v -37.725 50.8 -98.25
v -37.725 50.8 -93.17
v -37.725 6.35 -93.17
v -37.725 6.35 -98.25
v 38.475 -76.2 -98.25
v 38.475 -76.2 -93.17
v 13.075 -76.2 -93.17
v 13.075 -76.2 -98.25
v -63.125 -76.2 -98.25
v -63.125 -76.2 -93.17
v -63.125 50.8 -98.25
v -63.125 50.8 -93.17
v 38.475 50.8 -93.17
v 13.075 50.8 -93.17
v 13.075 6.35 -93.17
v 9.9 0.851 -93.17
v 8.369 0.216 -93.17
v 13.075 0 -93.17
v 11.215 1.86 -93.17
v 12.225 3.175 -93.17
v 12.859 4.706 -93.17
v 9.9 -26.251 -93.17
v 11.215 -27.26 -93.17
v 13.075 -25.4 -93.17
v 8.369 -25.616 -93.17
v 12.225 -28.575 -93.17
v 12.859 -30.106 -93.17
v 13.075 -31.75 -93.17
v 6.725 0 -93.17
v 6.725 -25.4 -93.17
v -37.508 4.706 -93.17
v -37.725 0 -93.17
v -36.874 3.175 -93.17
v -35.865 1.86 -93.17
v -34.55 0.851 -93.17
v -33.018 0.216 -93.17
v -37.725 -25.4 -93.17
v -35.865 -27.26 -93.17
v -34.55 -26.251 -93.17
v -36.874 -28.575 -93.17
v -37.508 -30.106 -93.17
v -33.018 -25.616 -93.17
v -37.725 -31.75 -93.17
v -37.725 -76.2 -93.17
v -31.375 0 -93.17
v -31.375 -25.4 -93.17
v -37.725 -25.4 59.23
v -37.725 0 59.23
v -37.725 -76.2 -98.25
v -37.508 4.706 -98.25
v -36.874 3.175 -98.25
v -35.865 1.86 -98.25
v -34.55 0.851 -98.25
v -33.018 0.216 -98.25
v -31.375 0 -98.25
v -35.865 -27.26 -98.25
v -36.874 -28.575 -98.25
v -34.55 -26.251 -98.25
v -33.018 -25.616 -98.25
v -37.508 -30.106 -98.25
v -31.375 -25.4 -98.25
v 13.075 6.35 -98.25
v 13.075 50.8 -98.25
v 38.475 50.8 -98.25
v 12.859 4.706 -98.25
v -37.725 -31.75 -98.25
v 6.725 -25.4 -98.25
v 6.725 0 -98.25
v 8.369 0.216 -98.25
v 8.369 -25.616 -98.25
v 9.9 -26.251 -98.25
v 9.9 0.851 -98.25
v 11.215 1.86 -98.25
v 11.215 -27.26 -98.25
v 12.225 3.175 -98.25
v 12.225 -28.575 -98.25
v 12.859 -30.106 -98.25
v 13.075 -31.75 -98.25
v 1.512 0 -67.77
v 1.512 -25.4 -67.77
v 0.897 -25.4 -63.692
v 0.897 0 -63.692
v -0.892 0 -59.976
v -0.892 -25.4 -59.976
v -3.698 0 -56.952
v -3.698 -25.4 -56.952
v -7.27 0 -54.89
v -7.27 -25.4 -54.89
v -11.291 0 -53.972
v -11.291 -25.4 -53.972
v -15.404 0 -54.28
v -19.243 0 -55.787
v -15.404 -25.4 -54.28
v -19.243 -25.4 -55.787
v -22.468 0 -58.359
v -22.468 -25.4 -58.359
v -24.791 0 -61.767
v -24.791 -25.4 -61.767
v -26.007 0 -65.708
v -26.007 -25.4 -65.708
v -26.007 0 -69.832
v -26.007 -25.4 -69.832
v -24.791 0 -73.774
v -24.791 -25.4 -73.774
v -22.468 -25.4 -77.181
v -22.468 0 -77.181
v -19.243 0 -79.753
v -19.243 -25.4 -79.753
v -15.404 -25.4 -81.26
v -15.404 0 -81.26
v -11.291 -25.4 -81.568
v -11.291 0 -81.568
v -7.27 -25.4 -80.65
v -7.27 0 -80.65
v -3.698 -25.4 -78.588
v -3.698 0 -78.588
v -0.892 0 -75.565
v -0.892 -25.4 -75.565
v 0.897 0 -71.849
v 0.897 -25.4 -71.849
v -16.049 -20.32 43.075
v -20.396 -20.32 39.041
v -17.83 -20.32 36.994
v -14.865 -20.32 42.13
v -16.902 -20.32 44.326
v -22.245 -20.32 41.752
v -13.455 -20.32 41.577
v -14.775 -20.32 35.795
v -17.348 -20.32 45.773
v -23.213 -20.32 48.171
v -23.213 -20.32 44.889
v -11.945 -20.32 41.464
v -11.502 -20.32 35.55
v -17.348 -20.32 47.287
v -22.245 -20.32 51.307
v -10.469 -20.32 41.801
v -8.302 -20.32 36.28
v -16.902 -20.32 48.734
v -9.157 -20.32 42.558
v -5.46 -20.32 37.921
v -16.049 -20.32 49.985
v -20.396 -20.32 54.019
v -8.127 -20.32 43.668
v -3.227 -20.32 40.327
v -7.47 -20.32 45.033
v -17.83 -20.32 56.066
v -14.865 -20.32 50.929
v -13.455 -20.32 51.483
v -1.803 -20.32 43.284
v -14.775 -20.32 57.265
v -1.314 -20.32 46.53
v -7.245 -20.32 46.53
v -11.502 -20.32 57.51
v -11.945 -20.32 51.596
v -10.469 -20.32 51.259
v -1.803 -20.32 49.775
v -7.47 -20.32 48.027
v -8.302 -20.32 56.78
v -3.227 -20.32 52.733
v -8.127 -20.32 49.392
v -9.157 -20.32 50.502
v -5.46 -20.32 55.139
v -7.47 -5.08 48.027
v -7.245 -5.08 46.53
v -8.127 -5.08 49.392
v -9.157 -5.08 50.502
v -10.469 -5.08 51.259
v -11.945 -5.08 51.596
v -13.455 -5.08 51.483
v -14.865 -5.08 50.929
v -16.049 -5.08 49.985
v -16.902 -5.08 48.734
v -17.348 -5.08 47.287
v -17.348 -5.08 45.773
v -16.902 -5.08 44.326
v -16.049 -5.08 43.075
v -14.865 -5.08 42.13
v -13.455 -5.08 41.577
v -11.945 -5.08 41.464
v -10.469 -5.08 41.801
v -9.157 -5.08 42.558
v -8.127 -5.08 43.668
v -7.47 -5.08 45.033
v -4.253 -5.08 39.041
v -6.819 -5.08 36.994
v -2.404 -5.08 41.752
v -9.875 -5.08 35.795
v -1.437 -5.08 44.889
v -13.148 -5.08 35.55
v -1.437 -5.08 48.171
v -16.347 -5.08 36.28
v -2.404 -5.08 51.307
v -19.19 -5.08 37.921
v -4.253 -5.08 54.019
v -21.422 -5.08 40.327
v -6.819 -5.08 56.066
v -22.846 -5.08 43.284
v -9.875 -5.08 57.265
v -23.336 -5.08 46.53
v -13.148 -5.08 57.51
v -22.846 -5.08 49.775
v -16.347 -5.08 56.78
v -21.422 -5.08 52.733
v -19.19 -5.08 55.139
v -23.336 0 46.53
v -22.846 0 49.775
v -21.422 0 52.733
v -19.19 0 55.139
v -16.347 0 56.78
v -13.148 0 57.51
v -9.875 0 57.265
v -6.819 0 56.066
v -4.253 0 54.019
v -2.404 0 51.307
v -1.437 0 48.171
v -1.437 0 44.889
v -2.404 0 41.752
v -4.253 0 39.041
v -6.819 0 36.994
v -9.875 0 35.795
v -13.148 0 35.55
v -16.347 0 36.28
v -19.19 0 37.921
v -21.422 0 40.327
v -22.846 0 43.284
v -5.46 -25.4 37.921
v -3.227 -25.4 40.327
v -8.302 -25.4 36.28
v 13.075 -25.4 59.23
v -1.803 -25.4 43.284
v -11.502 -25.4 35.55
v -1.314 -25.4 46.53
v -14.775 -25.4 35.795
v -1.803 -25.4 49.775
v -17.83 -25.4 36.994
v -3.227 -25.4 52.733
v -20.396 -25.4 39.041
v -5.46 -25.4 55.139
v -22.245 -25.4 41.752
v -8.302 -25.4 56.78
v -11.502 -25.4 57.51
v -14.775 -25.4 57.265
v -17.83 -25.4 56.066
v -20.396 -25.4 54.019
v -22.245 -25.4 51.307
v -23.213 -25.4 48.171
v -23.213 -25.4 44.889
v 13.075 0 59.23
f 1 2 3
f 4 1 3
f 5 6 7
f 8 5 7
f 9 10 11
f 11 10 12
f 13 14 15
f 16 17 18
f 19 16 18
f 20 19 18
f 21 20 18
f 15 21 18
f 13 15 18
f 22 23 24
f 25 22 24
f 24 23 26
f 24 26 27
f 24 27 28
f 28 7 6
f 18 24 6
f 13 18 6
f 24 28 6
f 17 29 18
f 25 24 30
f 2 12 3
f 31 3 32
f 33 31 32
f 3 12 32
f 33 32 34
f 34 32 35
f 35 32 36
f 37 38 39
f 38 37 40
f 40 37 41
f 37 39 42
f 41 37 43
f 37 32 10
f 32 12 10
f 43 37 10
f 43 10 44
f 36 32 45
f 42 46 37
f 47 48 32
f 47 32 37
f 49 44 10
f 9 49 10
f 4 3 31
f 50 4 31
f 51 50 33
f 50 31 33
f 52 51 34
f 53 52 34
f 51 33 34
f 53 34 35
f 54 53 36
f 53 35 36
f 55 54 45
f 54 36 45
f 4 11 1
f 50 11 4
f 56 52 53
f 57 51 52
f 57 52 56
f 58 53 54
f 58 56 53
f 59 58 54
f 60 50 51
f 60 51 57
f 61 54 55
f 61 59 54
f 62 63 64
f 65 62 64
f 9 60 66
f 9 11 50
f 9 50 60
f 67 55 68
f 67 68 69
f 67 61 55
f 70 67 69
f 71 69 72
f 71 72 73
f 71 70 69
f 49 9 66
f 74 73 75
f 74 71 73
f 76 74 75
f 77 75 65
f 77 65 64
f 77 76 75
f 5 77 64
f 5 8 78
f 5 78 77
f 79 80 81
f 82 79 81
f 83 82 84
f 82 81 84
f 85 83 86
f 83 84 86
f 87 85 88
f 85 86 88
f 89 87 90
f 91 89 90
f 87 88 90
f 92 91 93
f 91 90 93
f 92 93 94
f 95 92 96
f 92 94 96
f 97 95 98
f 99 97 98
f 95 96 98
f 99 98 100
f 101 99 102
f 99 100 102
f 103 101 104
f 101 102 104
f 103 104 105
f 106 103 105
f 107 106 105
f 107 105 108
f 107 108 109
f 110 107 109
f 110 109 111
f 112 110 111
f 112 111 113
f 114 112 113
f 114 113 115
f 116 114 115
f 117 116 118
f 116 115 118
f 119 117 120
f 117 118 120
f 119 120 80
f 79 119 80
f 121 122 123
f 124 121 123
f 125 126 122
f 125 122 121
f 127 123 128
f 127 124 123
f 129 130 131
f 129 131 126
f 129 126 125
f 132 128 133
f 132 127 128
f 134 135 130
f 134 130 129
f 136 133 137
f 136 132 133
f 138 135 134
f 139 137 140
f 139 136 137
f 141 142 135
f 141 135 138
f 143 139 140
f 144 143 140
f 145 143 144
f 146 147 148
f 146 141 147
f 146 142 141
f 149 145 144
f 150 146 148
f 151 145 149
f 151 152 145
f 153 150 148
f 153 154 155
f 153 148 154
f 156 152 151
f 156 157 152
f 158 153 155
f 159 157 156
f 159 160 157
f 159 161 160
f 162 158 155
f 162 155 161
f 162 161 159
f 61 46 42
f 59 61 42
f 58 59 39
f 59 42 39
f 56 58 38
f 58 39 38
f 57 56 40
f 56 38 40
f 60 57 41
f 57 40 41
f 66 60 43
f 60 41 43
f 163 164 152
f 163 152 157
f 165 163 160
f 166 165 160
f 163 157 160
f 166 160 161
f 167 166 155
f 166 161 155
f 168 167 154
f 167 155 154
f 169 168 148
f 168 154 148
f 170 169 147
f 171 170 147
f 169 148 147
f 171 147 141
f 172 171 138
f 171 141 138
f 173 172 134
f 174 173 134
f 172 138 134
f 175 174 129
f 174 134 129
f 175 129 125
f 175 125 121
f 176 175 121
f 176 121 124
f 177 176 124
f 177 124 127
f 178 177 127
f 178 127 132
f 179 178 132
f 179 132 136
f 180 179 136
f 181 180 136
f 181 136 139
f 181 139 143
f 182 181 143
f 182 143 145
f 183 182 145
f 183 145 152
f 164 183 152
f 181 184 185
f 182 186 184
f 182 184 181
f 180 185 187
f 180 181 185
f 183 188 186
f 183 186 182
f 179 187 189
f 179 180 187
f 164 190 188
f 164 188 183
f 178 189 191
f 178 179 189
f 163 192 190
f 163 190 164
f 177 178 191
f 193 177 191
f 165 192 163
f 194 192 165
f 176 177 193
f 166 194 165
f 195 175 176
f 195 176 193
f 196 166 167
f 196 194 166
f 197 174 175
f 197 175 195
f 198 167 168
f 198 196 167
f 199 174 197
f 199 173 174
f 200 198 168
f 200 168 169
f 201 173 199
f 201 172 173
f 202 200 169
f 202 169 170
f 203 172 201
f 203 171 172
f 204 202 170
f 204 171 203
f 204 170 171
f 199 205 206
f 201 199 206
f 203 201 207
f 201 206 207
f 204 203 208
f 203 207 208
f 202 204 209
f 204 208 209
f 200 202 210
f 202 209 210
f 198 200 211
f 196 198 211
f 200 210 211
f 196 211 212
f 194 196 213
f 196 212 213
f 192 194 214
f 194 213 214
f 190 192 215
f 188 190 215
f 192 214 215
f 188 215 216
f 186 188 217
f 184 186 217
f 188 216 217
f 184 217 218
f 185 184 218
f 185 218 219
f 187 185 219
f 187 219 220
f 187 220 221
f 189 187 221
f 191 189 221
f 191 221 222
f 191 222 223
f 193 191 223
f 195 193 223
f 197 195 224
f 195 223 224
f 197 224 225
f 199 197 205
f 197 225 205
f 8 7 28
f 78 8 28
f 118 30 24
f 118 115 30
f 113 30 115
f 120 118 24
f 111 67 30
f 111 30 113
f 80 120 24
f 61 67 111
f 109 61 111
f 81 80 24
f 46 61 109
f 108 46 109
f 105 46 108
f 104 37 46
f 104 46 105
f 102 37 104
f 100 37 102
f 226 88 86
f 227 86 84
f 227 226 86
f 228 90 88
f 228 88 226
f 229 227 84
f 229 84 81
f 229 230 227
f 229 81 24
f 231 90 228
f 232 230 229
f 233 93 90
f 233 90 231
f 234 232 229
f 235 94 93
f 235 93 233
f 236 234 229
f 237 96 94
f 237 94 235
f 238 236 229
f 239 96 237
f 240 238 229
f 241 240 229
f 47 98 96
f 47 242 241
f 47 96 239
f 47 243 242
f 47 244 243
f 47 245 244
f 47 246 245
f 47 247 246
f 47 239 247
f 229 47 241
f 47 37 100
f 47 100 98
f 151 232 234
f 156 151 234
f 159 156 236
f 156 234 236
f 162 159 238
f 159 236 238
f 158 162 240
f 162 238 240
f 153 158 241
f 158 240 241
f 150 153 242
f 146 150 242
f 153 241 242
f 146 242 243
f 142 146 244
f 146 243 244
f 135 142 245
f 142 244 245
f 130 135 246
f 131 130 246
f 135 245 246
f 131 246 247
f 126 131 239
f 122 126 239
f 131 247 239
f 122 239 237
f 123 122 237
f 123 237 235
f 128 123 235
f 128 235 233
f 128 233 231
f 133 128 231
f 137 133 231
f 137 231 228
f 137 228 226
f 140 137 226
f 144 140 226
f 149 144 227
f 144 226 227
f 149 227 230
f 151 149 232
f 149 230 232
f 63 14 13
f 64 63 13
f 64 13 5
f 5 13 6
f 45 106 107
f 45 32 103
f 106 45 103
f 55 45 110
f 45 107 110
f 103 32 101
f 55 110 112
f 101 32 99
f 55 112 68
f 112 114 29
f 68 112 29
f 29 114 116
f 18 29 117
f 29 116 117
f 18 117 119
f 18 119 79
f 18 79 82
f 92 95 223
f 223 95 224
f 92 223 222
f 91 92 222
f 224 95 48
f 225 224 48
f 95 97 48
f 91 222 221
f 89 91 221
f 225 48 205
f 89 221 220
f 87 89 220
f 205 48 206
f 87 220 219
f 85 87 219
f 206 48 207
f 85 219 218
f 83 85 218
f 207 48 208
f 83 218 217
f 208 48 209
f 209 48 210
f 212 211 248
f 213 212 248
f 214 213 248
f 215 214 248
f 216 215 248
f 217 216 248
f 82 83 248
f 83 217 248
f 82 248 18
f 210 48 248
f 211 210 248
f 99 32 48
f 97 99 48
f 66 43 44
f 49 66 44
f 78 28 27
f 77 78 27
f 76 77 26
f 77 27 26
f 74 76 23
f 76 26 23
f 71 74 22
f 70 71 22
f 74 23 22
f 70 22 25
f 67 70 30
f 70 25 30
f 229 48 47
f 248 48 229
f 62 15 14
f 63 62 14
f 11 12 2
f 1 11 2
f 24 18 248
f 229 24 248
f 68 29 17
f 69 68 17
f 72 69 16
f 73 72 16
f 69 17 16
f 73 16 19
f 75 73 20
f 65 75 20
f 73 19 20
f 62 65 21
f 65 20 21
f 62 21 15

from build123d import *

# Parameters (mm, degrees)
F0_W      = 25.4
F0_H      = 127
F1_DEPTH  = 25.4
F2_W      = 50.8
F2_H      = 25.4
F3_DEPTH  = 25.4
F4_R      = 5.08
F5_DEPTH  = 25.4
F6_R      = 11.0109
F7_DEPTH  = 5.08
F8_R      = 11.0109
F9_DEPTH  = 5.08
F10_DEPTH = 25.4
F11_W     = 25.4
F11_H     = 127
F12_DEPTH = 12.7
F13_DEPTH = 12.7
F14_R     = 13.83665
F15_DEPTH = 25.4
F17_DEPTH = 5.08


with BuildPart() as f1:
    # F0 (on Front) → F1 (new body)
    with BuildSketch(Plane.XZ):
        with Locations((-12.3247115396, -29.6700978652)):
            Rectangle(F0_W, F0_H)
    extrude(amount=F1_DEPTH)

    # F2 (on face) → F3 (join)
    with BuildSketch(Plane.XY.offset(33.8299021348)):
        with Locations((-12.3247115396, -12.7)):
            Rectangle(F2_W, F2_H)
    extrude(amount=F3_DEPTH)

    # F4 (on face) → F5 (cut)
    with BuildSketch(Plane.XZ.offset(25.4)):
        with Locations((-12.3247115396, 46.5299021348)):
            Circle(F4_R)
    extrude(amount=-F5_DEPTH, mode=Mode.SUBTRACT)

    # F6 (on face) → F7 (cut)
    with BuildSketch(Plane.XZ.offset(25.4)):
        with Locations((-12.3247115396, 46.5299021348)):
            Circle(F6_R)
    extrude(amount=-F7_DEPTH, mode=Mode.SUBTRACT)

    # F8 (on face) → F9 (cut)
    with BuildSketch(Plane(origin=(0, 0, 0), x_dir=(-1, 0, 0), z_dir=(0, 1, 0))):
        with Locations((12.3247115396, 46.5299021348)):
            Circle(F8_R)
    extrude(amount=-F9_DEPTH, mode=Mode.SUBTRACT)

    # F4 (on face) → F10 (cut)
    with BuildSketch(Plane.XZ.offset(25.4)):
        with Locations((-12.3247115396, 46.5299021348)):
            Circle(F4_R)
    extrude(amount=-F10_DEPTH, mode=Mode.SUBTRACT)

    # F11 (on face) → F12 (join)
    with BuildSketch(Plane(origin=(-25.0247115396, 0, 0), x_dir=(0, -1, 0), z_dir=(-1, 0, 0))):
        with Locations((12.7, -29.6700978652)):
            Rectangle(F11_W, F11_H)
    extrude(amount=F12_DEPTH)

    # F13 (add): a face of the model
    f13_faces = [f1.faces().sort_by_distance(p)[0] for p in [
        (0.3752884604, -12.7, -29.6700978652),
    ]]
    extrude(f13_faces, amount=F13_DEPTH)

    # F14 (on face) → F15 (cut)
    with BuildSketch(Plane.XZ.offset(25.4)):
        with Locations((-12.3247115396, -67.7700978652)):
            Circle(F14_R)
    extrude(amount=-F15_DEPTH, mode=Mode.SUBTRACT)

    # F16 (on face) → F17 (join)
    with BuildSketch(Plane(origin=(0, 0, -93.1700978652), x_dir=(1, 0, 0), z_dir=(0, 0, -1))):
        with BuildLine():
            ThreePointArc((-37.7247115396, -6.35), (-35.8648396001, -1.8598719395), (-31.3747115396, 0))
            Line((-31.3747115396, 0), (6.7252884604, 0))
            ThreePointArc((6.7252884604, 0), (11.2154165209, -1.8598719395), (13.0752884604, -6.35))
            Line((13.0752884604, -6.35), (13.0752884604, -50.8))
            Line((13.0752884604, -50.8), (38.4752884604, -50.8))
            Line((38.4752884604, -50.8), (38.4752884604, 0))
            Line((38.4752884604, 0), (38.4752884604, 25.4))
            Line((38.4752884604, 25.4), (38.4752884604, 76.2))
            Line((38.4752884604, 76.2), (13.0752884604, 76.2))
            Line((13.0752884604, 76.2), (13.0752884604, 31.75))
            ThreePointArc((13.0752884604, 31.75), (11.2154165209, 27.2598719395), (6.7252884604, 25.4))
            Line((6.7252884604, 25.4), (-31.3747115396, 25.4))
            ThreePointArc((-31.3747115396, 25.4), (-35.8648396001, 27.2598719395), (-37.7247115396, 31.75))
            Line((-37.7247115396, 31.75), (-37.7247115396, 76.2))
            Line((-37.7247115396, 76.2), (-63.1247115396, 76.2))
            Line((-63.1247115396, 76.2), (-63.1247115396, 25.4))
            Line((-63.1247115396, 25.4), (-63.1247115396, 0))
            Line((-63.1247115396, 0), (-63.1247115396, -50.8))
            Line((-63.1247115396, -50.8), (-37.7247115396, -50.8))
            Line((-37.7247115396, -50.8), (-37.7247115396, -6.35))
        make_face()
    extrude(amount=F17_DEPTH)


solid = f1.part
